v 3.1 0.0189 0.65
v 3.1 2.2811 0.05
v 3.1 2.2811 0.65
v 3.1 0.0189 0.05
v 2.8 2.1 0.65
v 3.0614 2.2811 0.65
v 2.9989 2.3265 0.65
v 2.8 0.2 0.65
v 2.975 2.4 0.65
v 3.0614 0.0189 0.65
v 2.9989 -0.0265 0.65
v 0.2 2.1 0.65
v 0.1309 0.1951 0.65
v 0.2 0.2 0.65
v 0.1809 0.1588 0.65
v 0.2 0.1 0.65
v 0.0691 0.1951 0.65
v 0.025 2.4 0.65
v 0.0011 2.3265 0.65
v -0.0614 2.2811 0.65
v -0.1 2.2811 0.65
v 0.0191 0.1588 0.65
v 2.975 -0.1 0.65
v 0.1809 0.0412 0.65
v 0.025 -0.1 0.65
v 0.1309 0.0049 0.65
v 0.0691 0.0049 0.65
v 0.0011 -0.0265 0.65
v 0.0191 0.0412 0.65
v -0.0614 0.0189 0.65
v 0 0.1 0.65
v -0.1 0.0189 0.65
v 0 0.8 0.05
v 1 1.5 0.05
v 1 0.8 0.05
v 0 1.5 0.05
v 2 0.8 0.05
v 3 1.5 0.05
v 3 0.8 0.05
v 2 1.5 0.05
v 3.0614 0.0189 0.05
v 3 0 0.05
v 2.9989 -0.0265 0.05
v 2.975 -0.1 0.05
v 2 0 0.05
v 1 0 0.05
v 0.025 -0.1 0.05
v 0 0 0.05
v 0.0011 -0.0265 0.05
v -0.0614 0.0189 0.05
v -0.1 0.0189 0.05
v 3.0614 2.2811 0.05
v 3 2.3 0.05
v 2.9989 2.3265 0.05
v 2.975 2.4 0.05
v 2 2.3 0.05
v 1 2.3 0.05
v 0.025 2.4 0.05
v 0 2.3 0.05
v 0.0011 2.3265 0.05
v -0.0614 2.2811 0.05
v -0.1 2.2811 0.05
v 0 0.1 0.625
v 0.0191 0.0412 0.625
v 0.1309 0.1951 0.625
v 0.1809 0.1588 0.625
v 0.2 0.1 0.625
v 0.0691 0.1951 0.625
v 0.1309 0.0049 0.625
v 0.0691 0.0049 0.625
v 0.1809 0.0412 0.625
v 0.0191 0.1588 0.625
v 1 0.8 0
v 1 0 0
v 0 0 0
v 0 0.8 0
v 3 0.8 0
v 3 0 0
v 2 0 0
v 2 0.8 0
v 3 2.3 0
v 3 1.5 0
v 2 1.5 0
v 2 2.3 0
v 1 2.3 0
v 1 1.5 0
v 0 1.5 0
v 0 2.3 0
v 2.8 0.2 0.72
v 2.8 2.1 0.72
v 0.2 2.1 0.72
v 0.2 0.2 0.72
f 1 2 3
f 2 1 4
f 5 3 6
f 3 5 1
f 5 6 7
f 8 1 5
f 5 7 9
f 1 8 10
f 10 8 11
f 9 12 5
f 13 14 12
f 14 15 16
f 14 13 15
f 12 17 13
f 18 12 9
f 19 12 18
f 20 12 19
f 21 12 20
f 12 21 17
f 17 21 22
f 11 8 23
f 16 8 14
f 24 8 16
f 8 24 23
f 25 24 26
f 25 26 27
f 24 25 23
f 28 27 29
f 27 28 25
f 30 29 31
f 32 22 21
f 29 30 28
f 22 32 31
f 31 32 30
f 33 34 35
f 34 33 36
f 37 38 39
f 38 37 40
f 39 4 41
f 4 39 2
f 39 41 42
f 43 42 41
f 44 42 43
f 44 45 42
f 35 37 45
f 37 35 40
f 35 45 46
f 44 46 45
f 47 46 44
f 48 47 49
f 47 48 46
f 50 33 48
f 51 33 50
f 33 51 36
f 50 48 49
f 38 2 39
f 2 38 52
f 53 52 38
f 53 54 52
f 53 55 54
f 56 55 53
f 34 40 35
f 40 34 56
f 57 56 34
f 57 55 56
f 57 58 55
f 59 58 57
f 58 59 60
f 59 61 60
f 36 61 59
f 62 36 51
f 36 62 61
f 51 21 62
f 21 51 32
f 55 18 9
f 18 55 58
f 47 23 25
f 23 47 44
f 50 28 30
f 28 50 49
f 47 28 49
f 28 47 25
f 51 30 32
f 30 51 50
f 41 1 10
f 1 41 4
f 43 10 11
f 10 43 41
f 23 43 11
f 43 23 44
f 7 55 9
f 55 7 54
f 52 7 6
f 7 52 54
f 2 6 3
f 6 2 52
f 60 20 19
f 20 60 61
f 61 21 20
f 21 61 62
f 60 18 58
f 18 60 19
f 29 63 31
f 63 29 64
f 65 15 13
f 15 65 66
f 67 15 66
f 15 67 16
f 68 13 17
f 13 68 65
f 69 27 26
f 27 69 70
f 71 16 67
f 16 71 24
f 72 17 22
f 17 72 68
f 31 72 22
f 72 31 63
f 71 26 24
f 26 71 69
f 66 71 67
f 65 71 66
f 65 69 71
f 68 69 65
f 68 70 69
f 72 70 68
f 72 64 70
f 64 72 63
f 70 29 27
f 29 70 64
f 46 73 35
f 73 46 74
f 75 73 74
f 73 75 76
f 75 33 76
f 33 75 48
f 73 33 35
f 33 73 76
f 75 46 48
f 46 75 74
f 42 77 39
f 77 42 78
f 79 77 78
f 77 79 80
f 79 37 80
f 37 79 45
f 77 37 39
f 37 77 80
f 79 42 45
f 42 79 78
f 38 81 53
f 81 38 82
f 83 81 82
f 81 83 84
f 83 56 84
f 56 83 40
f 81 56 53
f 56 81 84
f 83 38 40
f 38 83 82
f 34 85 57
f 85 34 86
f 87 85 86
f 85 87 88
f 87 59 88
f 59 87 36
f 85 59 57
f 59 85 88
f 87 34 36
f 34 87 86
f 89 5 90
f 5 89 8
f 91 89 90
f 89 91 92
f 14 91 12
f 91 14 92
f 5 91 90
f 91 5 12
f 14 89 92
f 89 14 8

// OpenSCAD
pin_x = 1;
pin_y = 0.8;
pin_z = 0.05;

case_x = 3.2;
case_y = 2.5;
case_z = 0.6;
case_top_diff = 0.6;
case_top_size_z = 0.07;

color_pins = "#A0A0A0";
color_base = "#E0C000";
color_cap = "#FFE000";
color_notch = "#E0E0E0";

delta = 0.01;

module crystal_3225 (){
    
    union(){

        // case
        difference(){
            color(color_base)
            translate([-0.1,-0.1,pin_z])
            cube(size=[case_x,case_y,case_z], center = false);

            color(color_base)
            translate([-0.1,-0.1,-delta])
            cylinder(h=case_z+0.1+delta,d=0.25,center=false, $fn = 10);
            color(color_base)
            translate([-0.1+case_x,-0.1,-delta])
            cylinder(h=case_z+0.1+delta,d=0.25,center=false, $fn = 10);
            color(color_base)
            translate([-0.1+case_x,-0.1+case_y,-delta])
            cylinder(h=case_z+0.1+delta,d=0.25,center=false, $fn = 10);
            color(color_base)
            translate([-0.1,-0.1+case_y,-delta])
            cylinder(h=case_z+0.1+delta,d=0.25,center=false, $fn = 10);

            color(color_notch)
            translate([-0.1+0.2,-0.1+0.2,case_z+pin_z/2])
            cylinder (h=pin_z,d=0.2,center = false, $fn = 10);
        }

        // pins
        color(color_pins)
        cube(size = [pin_x,pin_y,pin_z], center=false);
        color(color_pins)
        translate([2,0,0])
        cube(size = [pin_x,pin_y,pin_z], center=false);
        color(color_pins)
        translate([2,1.5,0])
        cube(size = [pin_x,pin_y,pin_z], center=false);
        color(color_pins)
        translate([0,1.5,0])
        cube(size = [pin_x,pin_y,pin_z], center=false);

        // top
        color(color_cap)
        translate([-0.1+case_top_diff/2,-0.1+case_top_diff/2,pin_z+case_z])
        cube(size=[case_x-case_top_diff,case_y-case_top_diff,case_top_size_z], center = false);
    }
}

crystal_3225();
